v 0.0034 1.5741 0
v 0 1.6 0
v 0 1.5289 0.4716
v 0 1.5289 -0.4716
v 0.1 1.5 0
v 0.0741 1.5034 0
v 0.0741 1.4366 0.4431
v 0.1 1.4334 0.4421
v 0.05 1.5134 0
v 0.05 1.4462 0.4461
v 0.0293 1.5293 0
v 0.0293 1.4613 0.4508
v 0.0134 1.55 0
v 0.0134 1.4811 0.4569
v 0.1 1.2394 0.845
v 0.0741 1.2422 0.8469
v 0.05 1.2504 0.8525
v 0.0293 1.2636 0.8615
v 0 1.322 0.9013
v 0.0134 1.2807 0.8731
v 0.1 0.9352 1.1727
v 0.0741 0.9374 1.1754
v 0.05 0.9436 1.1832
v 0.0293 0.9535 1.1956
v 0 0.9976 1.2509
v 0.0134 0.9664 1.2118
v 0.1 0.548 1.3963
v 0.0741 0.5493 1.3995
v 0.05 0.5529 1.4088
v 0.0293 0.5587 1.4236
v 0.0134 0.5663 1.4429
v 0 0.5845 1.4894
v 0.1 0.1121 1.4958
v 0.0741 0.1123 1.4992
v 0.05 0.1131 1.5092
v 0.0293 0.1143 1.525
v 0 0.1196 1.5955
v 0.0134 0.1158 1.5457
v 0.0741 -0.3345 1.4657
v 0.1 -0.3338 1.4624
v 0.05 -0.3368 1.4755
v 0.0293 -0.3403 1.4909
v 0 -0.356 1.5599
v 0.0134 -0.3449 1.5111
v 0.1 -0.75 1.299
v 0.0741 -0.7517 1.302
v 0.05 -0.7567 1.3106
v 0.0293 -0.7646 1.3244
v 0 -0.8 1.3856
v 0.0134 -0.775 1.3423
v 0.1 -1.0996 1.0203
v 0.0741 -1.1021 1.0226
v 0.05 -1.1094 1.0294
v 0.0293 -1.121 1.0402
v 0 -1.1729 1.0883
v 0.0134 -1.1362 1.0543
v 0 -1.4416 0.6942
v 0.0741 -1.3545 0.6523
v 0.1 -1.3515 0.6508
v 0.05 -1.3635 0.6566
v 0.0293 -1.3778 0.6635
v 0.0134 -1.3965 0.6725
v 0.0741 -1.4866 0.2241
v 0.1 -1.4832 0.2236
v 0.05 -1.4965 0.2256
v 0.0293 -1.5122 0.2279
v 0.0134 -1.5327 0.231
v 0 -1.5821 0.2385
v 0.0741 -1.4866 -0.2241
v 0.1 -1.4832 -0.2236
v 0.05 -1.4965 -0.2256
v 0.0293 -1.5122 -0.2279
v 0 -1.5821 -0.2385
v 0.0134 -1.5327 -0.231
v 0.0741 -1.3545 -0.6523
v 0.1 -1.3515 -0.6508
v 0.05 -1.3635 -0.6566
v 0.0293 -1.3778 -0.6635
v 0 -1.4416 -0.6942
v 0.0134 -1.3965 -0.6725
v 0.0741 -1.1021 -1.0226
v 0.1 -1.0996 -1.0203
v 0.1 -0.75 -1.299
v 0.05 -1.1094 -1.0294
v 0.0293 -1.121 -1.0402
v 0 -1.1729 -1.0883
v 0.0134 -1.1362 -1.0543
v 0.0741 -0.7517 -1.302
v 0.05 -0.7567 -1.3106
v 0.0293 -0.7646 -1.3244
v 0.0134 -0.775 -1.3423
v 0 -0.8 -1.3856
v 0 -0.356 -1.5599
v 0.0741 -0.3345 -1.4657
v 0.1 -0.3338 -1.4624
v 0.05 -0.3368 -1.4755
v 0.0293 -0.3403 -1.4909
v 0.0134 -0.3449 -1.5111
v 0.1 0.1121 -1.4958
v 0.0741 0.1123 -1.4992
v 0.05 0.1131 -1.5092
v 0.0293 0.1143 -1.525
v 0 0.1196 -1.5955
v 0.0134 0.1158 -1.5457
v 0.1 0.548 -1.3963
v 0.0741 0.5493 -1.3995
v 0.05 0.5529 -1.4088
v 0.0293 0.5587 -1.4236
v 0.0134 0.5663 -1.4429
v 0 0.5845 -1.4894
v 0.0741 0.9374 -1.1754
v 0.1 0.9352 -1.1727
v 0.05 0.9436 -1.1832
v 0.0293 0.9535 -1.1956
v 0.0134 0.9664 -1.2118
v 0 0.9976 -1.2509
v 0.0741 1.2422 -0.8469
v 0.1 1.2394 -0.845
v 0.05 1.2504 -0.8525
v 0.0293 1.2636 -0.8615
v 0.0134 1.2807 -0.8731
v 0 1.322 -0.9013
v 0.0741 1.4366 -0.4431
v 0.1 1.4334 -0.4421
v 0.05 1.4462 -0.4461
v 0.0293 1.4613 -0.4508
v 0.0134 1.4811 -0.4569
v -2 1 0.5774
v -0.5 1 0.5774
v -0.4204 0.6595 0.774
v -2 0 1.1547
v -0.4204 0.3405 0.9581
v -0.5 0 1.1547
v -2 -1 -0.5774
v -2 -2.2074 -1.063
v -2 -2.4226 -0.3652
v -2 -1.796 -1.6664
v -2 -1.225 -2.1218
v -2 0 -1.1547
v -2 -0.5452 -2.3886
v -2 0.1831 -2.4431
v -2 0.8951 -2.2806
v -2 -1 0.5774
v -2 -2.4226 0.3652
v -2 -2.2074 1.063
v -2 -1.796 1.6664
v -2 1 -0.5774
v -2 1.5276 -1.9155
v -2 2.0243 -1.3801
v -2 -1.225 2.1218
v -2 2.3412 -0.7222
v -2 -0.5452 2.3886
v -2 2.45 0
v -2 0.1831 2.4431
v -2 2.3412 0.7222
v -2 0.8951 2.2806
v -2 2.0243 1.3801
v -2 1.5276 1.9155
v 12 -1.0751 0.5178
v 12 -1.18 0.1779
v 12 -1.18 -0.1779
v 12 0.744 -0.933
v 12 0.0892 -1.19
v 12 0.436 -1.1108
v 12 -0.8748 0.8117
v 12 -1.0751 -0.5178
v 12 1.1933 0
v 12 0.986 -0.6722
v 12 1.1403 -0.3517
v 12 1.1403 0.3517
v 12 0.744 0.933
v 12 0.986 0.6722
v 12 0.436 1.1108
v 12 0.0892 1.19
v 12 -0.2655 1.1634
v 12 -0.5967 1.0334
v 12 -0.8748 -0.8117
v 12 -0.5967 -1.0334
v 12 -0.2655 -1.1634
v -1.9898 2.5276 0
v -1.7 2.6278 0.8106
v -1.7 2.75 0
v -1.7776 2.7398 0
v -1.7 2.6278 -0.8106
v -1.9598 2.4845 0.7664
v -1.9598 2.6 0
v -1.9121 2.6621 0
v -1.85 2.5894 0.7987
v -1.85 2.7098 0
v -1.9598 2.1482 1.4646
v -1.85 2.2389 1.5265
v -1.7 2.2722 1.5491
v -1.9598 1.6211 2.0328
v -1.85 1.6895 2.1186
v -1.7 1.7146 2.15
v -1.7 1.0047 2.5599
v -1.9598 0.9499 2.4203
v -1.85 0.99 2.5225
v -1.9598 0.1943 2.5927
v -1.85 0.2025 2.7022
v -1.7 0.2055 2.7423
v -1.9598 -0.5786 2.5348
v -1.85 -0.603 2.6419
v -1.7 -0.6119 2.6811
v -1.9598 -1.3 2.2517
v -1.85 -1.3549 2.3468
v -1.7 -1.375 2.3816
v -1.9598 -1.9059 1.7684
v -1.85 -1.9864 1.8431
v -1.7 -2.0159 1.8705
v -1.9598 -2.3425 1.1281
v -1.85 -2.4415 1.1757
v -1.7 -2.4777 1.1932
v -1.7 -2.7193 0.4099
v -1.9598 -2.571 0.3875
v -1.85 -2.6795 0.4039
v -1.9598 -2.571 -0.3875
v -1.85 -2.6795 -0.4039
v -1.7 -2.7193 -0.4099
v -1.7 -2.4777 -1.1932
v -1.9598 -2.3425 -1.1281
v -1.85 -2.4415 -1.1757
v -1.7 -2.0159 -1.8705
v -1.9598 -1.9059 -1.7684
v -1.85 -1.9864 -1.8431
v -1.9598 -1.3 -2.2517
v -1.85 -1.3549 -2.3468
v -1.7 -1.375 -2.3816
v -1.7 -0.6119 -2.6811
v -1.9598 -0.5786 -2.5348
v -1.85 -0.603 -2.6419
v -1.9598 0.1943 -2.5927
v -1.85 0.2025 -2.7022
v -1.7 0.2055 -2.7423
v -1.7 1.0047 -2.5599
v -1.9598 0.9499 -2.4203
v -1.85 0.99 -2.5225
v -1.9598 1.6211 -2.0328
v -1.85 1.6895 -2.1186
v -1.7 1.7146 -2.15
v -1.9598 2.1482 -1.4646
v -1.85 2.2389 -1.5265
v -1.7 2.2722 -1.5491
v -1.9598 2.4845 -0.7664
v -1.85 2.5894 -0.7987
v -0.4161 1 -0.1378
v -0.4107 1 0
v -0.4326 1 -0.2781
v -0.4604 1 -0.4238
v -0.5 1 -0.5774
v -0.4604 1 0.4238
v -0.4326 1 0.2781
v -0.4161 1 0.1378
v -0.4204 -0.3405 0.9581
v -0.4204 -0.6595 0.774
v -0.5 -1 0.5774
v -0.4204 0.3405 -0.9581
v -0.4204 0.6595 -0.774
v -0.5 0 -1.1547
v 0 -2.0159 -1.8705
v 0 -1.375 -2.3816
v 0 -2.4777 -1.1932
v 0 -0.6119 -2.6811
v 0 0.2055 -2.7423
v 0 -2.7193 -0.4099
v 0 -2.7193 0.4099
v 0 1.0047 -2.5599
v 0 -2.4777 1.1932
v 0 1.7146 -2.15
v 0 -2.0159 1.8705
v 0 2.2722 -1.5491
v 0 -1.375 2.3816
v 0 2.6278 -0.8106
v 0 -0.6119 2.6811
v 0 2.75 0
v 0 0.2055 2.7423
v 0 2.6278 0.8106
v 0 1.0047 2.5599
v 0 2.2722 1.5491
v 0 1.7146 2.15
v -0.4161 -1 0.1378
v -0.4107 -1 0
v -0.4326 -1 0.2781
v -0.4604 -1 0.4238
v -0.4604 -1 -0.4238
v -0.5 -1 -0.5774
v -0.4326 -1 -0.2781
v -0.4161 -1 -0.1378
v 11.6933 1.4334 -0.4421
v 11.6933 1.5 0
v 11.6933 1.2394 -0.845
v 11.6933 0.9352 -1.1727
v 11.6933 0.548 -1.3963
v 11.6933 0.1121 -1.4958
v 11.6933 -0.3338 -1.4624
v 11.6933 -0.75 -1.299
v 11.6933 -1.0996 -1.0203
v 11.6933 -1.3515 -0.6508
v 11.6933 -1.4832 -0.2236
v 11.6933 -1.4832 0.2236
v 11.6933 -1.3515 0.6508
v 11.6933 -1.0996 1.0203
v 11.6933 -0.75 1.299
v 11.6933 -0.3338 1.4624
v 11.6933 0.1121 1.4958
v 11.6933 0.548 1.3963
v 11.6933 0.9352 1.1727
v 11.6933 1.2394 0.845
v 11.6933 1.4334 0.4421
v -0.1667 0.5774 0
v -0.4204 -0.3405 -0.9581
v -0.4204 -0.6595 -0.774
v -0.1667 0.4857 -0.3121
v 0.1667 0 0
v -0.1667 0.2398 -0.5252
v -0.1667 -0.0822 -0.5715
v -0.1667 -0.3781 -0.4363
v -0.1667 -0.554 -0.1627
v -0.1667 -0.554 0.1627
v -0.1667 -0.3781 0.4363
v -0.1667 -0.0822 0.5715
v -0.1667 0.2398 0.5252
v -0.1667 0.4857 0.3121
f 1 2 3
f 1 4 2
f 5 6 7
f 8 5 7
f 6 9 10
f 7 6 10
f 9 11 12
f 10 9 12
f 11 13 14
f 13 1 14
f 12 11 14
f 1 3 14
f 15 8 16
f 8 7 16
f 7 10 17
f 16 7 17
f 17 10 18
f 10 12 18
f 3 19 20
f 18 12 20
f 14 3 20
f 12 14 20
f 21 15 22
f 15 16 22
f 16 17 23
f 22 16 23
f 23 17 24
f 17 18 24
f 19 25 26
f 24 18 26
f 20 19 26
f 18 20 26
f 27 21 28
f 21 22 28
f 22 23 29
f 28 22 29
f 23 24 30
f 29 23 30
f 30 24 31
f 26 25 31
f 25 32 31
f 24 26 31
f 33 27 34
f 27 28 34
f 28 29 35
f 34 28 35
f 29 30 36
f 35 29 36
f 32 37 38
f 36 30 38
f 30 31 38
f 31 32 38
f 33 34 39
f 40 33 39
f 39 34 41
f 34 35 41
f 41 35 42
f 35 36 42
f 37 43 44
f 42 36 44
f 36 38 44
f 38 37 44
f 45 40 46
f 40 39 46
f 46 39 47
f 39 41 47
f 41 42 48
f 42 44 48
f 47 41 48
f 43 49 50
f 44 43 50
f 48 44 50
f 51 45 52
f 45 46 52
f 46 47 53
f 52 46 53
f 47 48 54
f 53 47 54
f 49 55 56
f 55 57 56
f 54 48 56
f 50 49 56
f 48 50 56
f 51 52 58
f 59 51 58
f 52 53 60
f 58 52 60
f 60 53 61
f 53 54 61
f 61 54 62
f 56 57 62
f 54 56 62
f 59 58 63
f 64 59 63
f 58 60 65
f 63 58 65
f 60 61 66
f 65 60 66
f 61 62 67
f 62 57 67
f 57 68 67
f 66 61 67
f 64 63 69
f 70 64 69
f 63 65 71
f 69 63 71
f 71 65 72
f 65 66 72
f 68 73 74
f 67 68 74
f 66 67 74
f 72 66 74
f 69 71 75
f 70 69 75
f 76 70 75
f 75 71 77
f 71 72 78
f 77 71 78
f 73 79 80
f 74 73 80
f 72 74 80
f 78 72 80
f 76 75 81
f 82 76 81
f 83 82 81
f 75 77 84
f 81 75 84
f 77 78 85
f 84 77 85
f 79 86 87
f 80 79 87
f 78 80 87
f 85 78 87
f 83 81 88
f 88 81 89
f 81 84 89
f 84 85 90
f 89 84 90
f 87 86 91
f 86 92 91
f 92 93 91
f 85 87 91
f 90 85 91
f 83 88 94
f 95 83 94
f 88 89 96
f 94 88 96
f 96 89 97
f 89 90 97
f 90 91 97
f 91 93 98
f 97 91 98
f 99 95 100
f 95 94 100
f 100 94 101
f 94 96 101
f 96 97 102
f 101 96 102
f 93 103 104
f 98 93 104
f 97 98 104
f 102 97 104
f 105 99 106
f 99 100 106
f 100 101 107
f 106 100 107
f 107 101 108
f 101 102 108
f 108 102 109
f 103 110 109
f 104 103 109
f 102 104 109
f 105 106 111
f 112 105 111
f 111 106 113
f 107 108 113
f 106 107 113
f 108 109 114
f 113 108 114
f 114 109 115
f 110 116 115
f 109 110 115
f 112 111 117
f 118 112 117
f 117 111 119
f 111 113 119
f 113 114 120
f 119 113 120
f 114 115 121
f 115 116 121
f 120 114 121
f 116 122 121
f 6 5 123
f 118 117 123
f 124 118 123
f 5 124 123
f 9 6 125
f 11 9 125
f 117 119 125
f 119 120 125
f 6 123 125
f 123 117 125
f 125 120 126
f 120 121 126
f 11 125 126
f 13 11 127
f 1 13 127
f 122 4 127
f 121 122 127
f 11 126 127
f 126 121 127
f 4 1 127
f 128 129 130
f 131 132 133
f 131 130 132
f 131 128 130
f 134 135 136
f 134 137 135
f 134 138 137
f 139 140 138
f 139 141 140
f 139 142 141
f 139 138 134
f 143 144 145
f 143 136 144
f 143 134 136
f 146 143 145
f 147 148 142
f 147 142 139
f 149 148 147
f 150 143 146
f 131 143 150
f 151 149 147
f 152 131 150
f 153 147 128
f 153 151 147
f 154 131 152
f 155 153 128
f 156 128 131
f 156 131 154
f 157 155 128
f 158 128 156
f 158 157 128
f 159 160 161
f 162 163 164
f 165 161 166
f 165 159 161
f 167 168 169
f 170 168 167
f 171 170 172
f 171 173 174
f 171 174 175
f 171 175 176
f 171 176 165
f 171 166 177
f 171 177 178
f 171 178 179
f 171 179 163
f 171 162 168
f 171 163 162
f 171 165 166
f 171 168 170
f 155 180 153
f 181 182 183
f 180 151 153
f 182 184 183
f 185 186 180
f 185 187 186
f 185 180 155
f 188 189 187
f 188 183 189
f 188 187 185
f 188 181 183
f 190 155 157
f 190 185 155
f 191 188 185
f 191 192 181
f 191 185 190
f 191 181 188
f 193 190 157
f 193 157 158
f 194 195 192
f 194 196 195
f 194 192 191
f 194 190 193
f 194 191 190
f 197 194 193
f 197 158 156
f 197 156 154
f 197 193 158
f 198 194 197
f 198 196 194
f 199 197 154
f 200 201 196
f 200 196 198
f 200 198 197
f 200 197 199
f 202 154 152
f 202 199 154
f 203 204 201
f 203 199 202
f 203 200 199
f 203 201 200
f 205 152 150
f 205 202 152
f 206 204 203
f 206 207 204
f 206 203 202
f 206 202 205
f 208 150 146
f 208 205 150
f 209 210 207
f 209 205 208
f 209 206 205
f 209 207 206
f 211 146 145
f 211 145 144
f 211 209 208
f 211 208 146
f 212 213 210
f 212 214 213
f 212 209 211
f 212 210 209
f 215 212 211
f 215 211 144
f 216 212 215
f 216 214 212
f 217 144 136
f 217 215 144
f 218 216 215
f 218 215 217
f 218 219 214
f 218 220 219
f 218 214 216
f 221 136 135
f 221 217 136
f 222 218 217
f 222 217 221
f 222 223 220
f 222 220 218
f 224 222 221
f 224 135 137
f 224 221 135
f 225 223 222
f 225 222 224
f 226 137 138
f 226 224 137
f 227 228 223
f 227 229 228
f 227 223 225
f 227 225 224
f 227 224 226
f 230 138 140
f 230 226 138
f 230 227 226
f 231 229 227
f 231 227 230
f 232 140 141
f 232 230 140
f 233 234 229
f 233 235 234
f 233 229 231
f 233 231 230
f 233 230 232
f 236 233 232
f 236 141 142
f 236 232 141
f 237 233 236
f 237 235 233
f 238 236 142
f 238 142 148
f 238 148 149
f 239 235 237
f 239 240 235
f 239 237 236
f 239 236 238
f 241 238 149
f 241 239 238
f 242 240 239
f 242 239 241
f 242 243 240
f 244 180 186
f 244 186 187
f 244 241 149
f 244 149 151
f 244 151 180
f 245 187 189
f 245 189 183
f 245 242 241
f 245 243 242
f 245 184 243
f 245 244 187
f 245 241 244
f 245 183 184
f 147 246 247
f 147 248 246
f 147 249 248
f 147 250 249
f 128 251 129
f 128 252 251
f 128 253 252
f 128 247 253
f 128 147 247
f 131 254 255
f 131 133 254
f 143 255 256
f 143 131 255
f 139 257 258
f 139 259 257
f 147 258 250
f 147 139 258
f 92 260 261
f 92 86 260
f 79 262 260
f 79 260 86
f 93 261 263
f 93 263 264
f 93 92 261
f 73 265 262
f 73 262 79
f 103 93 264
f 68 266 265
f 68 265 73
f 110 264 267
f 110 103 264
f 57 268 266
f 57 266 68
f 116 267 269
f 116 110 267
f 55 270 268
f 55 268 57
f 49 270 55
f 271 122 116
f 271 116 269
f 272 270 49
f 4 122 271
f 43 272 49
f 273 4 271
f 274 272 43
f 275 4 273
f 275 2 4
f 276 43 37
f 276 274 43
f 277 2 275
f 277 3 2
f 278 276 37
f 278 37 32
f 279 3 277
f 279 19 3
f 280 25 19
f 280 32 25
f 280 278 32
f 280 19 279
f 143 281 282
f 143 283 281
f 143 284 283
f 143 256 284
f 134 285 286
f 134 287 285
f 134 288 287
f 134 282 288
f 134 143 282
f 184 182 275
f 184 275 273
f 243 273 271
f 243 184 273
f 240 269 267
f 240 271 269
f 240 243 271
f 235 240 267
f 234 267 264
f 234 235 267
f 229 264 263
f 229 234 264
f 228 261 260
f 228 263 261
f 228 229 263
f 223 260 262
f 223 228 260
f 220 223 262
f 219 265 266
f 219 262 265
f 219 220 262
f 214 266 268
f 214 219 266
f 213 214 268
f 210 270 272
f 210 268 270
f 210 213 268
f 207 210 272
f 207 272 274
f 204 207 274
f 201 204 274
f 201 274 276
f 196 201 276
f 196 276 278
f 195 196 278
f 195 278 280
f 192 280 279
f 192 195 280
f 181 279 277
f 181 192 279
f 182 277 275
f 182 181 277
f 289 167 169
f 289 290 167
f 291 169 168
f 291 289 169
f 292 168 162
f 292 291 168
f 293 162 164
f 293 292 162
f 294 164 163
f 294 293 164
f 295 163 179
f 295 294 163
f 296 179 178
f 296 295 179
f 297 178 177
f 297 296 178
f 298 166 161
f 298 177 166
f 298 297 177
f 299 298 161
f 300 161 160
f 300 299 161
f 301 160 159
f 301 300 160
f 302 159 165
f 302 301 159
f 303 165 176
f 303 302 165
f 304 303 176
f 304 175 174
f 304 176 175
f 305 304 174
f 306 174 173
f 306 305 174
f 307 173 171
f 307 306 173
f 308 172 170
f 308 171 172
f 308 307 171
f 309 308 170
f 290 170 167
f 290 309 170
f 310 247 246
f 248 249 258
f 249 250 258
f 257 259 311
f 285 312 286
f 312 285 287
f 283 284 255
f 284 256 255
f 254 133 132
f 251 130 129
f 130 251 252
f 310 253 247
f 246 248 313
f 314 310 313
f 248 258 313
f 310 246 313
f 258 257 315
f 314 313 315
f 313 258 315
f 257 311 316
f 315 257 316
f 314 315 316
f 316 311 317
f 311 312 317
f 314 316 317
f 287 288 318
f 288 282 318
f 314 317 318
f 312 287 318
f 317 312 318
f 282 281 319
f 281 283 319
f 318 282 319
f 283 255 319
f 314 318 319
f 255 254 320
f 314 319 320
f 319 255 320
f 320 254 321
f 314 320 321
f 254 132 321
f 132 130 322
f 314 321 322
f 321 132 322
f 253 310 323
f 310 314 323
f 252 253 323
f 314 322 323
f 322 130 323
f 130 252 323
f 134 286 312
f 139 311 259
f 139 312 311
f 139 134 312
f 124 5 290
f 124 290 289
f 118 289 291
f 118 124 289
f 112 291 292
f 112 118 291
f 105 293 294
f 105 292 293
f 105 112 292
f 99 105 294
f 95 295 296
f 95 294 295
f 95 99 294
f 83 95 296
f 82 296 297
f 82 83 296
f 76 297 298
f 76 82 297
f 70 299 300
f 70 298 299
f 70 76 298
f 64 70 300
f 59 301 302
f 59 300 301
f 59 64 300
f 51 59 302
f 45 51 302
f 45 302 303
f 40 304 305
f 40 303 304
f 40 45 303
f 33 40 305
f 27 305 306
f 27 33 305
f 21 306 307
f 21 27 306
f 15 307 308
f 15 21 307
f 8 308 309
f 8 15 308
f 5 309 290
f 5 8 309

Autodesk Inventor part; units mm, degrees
ref_plane "YZ Plane" through (0, 0, 0) normal (1, 0, 0) x (0, 1, 0)
ref_plane "XZ Plane" through (0, 0, 0) normal (0, 1, 0) x (-1, 0, 0)
sketch "Skizze1" plane through (0, 0, 0) normal (0, 0, 1) x (1, 0, 0)
  line L0 (0.1667, 0) -> (12, 0)
  line L1 (12, 0) -> (12, 1.5)
  line L2 (12, 1.5) -> (1.5, 1.5)
  line L3 (1.5, 1.5) -> (1.1932, 1.5)
  line L4 (1.1932, 1.5) -> (0, 1.5)
  line L5 (0, 1.5) -> (0, 2.75)
  line L6 (0, 2.75) -> (-2, 2.75)
  line L7 (-2, 2.75) -> (-2, 1.1547)
  line L8 (-2, 1.1547) -> (-0.5, 1.1547)
  line L9 (-0.5, 1.1547) -> (0.1667, 0)
  line L10 (-4.8, 0) -> (14.8, 0) projected
  line L11 (0, -0.55) -> (0, 3.3) projected
  line L12 (1.5, 1.5) -> (0, 1.5) construction
  dimension "d1" = 10.5
  dimension "d2" = 0.3068
  dimension "d3" = 2
  dimension "d4" = 1.5
  dimension "d5" = 60
  dimension "d6" = 3
  dimension "d7" = 3
  dimension "d8" = 2.3094
  dimension "d9" = 5.5
  dimension "d26" = 12
revolve "Körper" add sketch "Skizze1" angle 360 about axis through (0.1667, 0, 0) along (1, 0, 0) contours L9 L11 L4 L3 L2 L1 L0 | L9 L8 L7 L6 L5 L11
sketch "Skizze2" plane through (-2, 0, 0) normal (-1, 0, 0) x (0, 0, 1)
  circle A0 centre (0, 0) radius 1.1547 projected
  line L0 (0, -3.85) -> (0, 3.85) projected
  line L1 (-3.85, 0) -> (3.85, 0) projected
  line L2 (1.1547, 0) -> (0.5774, -1)
  line L3 (0.5774, -1) -> (-0.5774, -1)
  line L4 (-0.5774, -1) -> (-1.1547, 0)
  line L5 (-1.1547, 0) -> (-0.5774, 1)
  line L6 (-0.5774, 1) -> (0.5774, 1)
  line L7 (0.5774, 1) -> (1.1547, 0)
  point P0 (0, 0)
extrude "Loch" add sketch "Skizze2" against normal up to next contours L7 A0 | A0 L2 | L6 L0 A0 | A0 L0 L3 | L0 L6 A0 | A0 L3 L0 | L4 A0 | A0 L5
fillet "Rundung1" radius 0.3 1 edges at (-2, -2.75, 0)
thread "Gewinde" size "M3x0.5" class "6g" standard "ISO Metric profile" length 10.5
chamfer "Fase1" distance 0.3067 distance2 0.3067 1 edges at (12, -1.5, 0) measured on face at (12, -0.6587, -0.1791)
ref_plane "Work Plane1" through (29, 0, 0) normal (0, -1, 0) x (1, 0, 0)
fillet "Fillet2" radius 0.1 1 edges at (0, -1.5, 0)
equation "\"d1\" = GEL"
equation "\"d3\" = KOH"
equation "\"d4\" = INTI"
equation "\"d6\" = GD"
equation "\"d7\" = BDM"
equation "\"d8\" = 1.1547 * SW"
equation "\"d9\" = KOD"
equation "\"d26\" = NLG"
equation "\"d30\" = R"
equation "\"d17\" = RR"
equation "\"d13\" = GEL"
equation "\"d15\" = -0.5 * SPD + 0.5 * GD"
equation "\"d16\" = GUL"
equation "\"GD\" = NND"
equation "\"NLG\" = 12"
equation "\"GEL\" = 10.5"
equation "\"KOD\" = 5.5"
equation "\"KOH\" = 2"
equation "\"INTI\" = 1.5"
equation "\"GAL\" = 0.61345 * PTC"
equation "\"GUL\" = 0.61345 * PTC"
equation "\"BDM\" = NND"
equation "\"SW\" = 2"
equation "\"RR\" = 0.3"
equation "\"SPD\" = NND - 1.2269 * PTC"
equation "\"R\" = 0.1"
equation "\"TOA\" = 30deg"
equation "\"GD1\" = THREADDIA - 1.2269 * PTC"
equation "\"THREADDIA\" = 3"
equation "\"FAWI\" = 45deg"
equation "\"ANG\" = 120deg"
equation "\"PTC\" = 0.5"
equation "\"NND\" = 3"
equation "\"E0\" = 1.155 * SW"
properties part number "DIN 7984 - M3 x 12" material "Stahl, weich"
